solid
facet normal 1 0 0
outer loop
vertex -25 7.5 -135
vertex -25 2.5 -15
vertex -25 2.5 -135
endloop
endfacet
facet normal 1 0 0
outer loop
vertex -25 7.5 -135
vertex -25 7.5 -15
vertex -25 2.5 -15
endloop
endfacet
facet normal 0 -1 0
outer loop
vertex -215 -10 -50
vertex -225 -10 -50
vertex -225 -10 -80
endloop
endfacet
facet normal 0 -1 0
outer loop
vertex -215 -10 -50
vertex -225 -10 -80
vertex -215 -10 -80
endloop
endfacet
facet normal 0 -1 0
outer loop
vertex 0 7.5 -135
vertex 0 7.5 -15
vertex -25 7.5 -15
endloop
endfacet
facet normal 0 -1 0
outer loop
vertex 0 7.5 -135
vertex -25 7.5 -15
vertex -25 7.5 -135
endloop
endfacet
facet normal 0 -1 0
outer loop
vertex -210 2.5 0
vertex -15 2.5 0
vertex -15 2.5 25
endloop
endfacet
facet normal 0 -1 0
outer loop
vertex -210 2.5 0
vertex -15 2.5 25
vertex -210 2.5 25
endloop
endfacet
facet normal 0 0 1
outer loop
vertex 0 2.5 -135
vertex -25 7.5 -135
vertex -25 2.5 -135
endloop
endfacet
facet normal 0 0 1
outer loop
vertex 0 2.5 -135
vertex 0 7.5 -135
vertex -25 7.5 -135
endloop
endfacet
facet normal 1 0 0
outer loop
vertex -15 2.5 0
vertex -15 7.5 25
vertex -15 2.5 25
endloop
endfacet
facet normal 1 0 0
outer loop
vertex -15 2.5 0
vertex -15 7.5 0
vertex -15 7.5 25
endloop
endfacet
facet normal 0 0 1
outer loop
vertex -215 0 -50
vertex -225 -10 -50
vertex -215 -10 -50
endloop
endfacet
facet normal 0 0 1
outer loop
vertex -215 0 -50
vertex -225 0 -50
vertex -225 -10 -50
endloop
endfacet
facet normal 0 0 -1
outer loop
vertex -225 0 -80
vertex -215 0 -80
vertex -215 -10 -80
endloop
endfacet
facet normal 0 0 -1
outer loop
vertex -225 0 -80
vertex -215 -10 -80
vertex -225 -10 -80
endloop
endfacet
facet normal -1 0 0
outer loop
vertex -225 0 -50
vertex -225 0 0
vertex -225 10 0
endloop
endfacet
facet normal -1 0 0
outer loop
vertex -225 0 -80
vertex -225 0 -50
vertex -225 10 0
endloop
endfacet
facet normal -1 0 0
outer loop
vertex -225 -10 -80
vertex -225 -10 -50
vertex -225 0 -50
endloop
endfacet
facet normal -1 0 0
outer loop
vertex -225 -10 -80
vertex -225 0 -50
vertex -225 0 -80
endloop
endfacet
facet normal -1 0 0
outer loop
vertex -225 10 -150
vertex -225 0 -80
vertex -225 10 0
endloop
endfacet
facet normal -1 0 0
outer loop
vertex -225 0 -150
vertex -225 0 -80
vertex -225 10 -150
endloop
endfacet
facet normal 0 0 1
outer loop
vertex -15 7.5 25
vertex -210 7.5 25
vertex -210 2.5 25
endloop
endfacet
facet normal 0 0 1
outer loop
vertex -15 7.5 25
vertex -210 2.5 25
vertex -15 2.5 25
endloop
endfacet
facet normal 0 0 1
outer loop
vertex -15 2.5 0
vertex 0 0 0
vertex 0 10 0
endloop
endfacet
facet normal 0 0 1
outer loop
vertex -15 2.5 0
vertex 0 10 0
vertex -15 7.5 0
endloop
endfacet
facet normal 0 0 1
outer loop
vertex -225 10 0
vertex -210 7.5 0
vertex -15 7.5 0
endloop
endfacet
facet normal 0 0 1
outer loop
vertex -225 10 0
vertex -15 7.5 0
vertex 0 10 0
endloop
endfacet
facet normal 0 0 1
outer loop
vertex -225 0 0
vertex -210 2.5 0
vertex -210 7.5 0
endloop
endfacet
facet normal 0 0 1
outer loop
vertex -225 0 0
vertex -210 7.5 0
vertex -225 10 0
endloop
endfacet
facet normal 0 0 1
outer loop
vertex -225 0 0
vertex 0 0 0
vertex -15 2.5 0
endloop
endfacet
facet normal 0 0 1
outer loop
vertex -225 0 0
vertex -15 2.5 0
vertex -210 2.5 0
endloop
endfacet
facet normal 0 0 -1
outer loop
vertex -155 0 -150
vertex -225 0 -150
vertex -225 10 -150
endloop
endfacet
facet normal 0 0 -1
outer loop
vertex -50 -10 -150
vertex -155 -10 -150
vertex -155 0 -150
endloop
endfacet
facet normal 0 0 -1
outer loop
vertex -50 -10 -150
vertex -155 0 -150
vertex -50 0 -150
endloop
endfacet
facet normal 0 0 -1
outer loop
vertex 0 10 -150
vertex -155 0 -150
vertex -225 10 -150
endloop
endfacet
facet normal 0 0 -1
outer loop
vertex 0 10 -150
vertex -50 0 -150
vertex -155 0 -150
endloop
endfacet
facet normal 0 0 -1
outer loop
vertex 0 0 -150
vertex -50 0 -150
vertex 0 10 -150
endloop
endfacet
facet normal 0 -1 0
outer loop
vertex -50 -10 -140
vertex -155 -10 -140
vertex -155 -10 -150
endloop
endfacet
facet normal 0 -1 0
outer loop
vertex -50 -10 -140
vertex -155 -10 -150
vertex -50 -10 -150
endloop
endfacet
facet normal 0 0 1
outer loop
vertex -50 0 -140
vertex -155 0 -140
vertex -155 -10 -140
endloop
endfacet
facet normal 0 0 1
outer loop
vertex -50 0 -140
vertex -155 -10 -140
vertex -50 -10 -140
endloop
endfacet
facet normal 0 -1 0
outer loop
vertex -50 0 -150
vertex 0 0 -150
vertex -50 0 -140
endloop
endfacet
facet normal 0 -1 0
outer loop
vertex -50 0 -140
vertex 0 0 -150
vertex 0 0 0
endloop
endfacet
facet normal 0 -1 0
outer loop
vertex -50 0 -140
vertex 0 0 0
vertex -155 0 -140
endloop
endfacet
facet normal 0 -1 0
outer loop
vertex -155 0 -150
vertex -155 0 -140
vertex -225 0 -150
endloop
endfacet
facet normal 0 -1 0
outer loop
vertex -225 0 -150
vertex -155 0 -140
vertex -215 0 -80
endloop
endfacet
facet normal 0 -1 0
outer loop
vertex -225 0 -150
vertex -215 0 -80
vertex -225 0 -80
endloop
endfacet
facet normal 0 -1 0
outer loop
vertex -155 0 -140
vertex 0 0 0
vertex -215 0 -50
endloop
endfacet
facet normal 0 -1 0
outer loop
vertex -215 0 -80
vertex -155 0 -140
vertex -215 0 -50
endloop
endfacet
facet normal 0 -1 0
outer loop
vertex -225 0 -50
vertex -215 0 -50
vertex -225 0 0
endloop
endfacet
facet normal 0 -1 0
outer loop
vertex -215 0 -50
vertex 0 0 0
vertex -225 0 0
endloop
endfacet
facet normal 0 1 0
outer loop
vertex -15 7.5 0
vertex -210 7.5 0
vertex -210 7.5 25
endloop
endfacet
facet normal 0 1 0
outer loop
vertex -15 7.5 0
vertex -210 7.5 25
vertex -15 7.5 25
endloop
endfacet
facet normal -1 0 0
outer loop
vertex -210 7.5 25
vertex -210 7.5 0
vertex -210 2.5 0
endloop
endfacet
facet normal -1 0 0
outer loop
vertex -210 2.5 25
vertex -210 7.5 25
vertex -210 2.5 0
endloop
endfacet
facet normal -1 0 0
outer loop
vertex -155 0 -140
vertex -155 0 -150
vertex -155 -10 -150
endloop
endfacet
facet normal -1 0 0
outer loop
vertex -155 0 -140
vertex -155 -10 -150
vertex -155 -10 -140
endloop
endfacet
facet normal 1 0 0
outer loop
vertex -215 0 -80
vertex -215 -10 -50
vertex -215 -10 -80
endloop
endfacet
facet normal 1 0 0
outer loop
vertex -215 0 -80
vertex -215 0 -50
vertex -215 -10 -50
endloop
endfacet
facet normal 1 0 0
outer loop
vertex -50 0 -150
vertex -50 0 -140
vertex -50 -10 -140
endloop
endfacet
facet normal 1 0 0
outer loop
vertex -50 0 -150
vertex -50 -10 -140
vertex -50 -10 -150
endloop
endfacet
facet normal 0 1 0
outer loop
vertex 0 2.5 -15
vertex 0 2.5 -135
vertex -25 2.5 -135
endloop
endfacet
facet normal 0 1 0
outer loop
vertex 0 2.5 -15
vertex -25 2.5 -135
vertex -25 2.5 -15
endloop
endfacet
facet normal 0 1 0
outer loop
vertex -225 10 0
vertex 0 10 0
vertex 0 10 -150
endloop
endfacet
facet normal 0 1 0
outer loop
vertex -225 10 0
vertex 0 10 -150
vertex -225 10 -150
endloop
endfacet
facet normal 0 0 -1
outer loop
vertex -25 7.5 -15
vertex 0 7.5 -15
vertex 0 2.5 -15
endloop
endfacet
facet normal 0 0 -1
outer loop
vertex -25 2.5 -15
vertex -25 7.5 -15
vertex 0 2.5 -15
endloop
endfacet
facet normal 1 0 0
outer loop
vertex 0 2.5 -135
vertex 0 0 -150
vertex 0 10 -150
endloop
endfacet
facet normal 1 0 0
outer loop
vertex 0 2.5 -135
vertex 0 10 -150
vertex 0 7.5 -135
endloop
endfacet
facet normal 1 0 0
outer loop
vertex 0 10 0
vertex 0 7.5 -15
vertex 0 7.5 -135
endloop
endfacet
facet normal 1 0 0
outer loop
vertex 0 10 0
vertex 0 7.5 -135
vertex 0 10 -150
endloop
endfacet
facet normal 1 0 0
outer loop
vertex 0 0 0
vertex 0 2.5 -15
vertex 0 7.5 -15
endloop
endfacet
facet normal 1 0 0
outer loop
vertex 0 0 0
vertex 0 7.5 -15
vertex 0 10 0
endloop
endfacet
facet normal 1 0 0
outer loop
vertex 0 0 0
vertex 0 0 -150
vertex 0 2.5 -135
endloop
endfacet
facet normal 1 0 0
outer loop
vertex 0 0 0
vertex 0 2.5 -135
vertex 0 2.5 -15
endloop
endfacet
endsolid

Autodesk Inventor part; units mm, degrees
ref_plane "YZ Plane" through (0, 0, 0) normal (1, 0, 0) x (0, 1, 0)
ref_plane "XZ Plane" through (0, 0, 0) normal (0, 1, 0) x (-1, 0, 0)
ref_plane "XY Plane" through (0, 0, 0) normal (0, 0, 1) x (1, 0, 0)
sketch "Sketch1" plane through (0, 0, 0) normal (0, 1, 0) x (-1, 0, 0)
  line L0 (0, 0) -> (225, 0)
  line L1 (225, 0) -> (225, -150)
  line L2 (225, -150) -> (0, -150)
  line L3 (0, -150) -> (0, 0)
  dimension "d0" = 225
  dimension "d1" = 150
extrude "Extrusion1" add sketch "Sketch1" along normal blind 10
sketch "Sketch2" plane through (-225, 0, 0) normal (0, 0, 1) x (1, 0, 0)
  line L0 (0, 0) -> (0, 10) projected
  line L1 (225, 0) -> (225, 10) projected
  line L2 (0, 7.5) -> (225, 7.5)
  line L3 (225, 7.5) -> (225, 2.5)
  line L4 (225, 2.5) -> (0, 2.5)
  line L5 (0, 2.5) -> (0, 7.5)
  line L6 (225, 7.5) -> (210, 7.5)
  line L7 (210, 7.5) -> (210, 2.5)
  line L8 (210, 2.5) -> (225, 2.5)
  line L9 (225, 2.5) -> (225, 7.5)
  line L10 (0, 7.5) -> (15, 7.5)
  line L11 (15, 7.5) -> (15, 2.5)
  line L12 (15, 2.5) -> (0, 2.5)
  line L13 (0, 2.5) -> (0, 7.5)
  dimension "d4" = 5
  dimension "d5" = 15
  dimension "d6" = 5
  dimension "d7" = 15
  dimension "d8" = 5
sketch "Sketch3" plane through (0, 0, 0) normal (1, 0, 0) x (0, 0, -1)
  line L0 (0, 0) -> (0, 10) projected
  line L1 (0, 7.5) -> (150, 7.5)
  line L2 (150, 7.5) -> (150, 2.5)
  line L3 (150, 2.5) -> (0, 2.5)
  line L4 (0, 2.5) -> (0, 7.5)
  line L5 (0, 7.5) -> (15, 7.5)
  line L6 (15, 7.5) -> (15, 2.5)
  line L7 (15, 2.5) -> (0, 2.5)
  line L8 (0, 2.5) -> (0, 7.5)
  line L9 (150, 7.5) -> (135, 7.5)
  line L10 (135, 7.5) -> (135, 2.5)
  line L11 (135, 2.5) -> (150, 2.5)
  line L12 (150, 2.5) -> (150, 7.5)
  dimension "d9" = 150
  dimension "d10" = 5
  dimension "d11" = 15
  dimension "d12" = 5
  dimension "d13" = 15
  dimension "d14" = 5
extrude "Extrusion2" add sketch "Sketch2" along normal blind 25 contours L11 L2 L7 L4
extrude "Extrusion3" cut sketch "Sketch3" against normal blind 25 contours L6 L1 L10 L3
sketch "Sketch4" plane through (0, 0, 0) normal (0, -1, 0) x (1, 0, 0)
  line L0 (-225, -150) -> (-225, 0) projected
  line L1 (-225, -50) -> (-215, -50)
  line L2 (-215, -50) -> (-215, -80)
  line L3 (-215, -80) -> (-225, -80)
  line L4 (-225, -80) -> (-225, -50)
  line L5 (-50, -150) -> (-155, -150)
  line L6 (-155, -150) -> (-155, -140)
  line L7 (-155, -140) -> (-50, -140)
  line L8 (-50, -140) -> (-50, -150)
  point P0 (0, 0)
  dimension "d19" = 10
  dimension "d20" = 30
  dimension "d21" = 105
  dimension "d22" = 10
extrude "Extrusion4" add sketch "Sketch4" along normal blind 10
properties part number "TSU_MF_Floor"
